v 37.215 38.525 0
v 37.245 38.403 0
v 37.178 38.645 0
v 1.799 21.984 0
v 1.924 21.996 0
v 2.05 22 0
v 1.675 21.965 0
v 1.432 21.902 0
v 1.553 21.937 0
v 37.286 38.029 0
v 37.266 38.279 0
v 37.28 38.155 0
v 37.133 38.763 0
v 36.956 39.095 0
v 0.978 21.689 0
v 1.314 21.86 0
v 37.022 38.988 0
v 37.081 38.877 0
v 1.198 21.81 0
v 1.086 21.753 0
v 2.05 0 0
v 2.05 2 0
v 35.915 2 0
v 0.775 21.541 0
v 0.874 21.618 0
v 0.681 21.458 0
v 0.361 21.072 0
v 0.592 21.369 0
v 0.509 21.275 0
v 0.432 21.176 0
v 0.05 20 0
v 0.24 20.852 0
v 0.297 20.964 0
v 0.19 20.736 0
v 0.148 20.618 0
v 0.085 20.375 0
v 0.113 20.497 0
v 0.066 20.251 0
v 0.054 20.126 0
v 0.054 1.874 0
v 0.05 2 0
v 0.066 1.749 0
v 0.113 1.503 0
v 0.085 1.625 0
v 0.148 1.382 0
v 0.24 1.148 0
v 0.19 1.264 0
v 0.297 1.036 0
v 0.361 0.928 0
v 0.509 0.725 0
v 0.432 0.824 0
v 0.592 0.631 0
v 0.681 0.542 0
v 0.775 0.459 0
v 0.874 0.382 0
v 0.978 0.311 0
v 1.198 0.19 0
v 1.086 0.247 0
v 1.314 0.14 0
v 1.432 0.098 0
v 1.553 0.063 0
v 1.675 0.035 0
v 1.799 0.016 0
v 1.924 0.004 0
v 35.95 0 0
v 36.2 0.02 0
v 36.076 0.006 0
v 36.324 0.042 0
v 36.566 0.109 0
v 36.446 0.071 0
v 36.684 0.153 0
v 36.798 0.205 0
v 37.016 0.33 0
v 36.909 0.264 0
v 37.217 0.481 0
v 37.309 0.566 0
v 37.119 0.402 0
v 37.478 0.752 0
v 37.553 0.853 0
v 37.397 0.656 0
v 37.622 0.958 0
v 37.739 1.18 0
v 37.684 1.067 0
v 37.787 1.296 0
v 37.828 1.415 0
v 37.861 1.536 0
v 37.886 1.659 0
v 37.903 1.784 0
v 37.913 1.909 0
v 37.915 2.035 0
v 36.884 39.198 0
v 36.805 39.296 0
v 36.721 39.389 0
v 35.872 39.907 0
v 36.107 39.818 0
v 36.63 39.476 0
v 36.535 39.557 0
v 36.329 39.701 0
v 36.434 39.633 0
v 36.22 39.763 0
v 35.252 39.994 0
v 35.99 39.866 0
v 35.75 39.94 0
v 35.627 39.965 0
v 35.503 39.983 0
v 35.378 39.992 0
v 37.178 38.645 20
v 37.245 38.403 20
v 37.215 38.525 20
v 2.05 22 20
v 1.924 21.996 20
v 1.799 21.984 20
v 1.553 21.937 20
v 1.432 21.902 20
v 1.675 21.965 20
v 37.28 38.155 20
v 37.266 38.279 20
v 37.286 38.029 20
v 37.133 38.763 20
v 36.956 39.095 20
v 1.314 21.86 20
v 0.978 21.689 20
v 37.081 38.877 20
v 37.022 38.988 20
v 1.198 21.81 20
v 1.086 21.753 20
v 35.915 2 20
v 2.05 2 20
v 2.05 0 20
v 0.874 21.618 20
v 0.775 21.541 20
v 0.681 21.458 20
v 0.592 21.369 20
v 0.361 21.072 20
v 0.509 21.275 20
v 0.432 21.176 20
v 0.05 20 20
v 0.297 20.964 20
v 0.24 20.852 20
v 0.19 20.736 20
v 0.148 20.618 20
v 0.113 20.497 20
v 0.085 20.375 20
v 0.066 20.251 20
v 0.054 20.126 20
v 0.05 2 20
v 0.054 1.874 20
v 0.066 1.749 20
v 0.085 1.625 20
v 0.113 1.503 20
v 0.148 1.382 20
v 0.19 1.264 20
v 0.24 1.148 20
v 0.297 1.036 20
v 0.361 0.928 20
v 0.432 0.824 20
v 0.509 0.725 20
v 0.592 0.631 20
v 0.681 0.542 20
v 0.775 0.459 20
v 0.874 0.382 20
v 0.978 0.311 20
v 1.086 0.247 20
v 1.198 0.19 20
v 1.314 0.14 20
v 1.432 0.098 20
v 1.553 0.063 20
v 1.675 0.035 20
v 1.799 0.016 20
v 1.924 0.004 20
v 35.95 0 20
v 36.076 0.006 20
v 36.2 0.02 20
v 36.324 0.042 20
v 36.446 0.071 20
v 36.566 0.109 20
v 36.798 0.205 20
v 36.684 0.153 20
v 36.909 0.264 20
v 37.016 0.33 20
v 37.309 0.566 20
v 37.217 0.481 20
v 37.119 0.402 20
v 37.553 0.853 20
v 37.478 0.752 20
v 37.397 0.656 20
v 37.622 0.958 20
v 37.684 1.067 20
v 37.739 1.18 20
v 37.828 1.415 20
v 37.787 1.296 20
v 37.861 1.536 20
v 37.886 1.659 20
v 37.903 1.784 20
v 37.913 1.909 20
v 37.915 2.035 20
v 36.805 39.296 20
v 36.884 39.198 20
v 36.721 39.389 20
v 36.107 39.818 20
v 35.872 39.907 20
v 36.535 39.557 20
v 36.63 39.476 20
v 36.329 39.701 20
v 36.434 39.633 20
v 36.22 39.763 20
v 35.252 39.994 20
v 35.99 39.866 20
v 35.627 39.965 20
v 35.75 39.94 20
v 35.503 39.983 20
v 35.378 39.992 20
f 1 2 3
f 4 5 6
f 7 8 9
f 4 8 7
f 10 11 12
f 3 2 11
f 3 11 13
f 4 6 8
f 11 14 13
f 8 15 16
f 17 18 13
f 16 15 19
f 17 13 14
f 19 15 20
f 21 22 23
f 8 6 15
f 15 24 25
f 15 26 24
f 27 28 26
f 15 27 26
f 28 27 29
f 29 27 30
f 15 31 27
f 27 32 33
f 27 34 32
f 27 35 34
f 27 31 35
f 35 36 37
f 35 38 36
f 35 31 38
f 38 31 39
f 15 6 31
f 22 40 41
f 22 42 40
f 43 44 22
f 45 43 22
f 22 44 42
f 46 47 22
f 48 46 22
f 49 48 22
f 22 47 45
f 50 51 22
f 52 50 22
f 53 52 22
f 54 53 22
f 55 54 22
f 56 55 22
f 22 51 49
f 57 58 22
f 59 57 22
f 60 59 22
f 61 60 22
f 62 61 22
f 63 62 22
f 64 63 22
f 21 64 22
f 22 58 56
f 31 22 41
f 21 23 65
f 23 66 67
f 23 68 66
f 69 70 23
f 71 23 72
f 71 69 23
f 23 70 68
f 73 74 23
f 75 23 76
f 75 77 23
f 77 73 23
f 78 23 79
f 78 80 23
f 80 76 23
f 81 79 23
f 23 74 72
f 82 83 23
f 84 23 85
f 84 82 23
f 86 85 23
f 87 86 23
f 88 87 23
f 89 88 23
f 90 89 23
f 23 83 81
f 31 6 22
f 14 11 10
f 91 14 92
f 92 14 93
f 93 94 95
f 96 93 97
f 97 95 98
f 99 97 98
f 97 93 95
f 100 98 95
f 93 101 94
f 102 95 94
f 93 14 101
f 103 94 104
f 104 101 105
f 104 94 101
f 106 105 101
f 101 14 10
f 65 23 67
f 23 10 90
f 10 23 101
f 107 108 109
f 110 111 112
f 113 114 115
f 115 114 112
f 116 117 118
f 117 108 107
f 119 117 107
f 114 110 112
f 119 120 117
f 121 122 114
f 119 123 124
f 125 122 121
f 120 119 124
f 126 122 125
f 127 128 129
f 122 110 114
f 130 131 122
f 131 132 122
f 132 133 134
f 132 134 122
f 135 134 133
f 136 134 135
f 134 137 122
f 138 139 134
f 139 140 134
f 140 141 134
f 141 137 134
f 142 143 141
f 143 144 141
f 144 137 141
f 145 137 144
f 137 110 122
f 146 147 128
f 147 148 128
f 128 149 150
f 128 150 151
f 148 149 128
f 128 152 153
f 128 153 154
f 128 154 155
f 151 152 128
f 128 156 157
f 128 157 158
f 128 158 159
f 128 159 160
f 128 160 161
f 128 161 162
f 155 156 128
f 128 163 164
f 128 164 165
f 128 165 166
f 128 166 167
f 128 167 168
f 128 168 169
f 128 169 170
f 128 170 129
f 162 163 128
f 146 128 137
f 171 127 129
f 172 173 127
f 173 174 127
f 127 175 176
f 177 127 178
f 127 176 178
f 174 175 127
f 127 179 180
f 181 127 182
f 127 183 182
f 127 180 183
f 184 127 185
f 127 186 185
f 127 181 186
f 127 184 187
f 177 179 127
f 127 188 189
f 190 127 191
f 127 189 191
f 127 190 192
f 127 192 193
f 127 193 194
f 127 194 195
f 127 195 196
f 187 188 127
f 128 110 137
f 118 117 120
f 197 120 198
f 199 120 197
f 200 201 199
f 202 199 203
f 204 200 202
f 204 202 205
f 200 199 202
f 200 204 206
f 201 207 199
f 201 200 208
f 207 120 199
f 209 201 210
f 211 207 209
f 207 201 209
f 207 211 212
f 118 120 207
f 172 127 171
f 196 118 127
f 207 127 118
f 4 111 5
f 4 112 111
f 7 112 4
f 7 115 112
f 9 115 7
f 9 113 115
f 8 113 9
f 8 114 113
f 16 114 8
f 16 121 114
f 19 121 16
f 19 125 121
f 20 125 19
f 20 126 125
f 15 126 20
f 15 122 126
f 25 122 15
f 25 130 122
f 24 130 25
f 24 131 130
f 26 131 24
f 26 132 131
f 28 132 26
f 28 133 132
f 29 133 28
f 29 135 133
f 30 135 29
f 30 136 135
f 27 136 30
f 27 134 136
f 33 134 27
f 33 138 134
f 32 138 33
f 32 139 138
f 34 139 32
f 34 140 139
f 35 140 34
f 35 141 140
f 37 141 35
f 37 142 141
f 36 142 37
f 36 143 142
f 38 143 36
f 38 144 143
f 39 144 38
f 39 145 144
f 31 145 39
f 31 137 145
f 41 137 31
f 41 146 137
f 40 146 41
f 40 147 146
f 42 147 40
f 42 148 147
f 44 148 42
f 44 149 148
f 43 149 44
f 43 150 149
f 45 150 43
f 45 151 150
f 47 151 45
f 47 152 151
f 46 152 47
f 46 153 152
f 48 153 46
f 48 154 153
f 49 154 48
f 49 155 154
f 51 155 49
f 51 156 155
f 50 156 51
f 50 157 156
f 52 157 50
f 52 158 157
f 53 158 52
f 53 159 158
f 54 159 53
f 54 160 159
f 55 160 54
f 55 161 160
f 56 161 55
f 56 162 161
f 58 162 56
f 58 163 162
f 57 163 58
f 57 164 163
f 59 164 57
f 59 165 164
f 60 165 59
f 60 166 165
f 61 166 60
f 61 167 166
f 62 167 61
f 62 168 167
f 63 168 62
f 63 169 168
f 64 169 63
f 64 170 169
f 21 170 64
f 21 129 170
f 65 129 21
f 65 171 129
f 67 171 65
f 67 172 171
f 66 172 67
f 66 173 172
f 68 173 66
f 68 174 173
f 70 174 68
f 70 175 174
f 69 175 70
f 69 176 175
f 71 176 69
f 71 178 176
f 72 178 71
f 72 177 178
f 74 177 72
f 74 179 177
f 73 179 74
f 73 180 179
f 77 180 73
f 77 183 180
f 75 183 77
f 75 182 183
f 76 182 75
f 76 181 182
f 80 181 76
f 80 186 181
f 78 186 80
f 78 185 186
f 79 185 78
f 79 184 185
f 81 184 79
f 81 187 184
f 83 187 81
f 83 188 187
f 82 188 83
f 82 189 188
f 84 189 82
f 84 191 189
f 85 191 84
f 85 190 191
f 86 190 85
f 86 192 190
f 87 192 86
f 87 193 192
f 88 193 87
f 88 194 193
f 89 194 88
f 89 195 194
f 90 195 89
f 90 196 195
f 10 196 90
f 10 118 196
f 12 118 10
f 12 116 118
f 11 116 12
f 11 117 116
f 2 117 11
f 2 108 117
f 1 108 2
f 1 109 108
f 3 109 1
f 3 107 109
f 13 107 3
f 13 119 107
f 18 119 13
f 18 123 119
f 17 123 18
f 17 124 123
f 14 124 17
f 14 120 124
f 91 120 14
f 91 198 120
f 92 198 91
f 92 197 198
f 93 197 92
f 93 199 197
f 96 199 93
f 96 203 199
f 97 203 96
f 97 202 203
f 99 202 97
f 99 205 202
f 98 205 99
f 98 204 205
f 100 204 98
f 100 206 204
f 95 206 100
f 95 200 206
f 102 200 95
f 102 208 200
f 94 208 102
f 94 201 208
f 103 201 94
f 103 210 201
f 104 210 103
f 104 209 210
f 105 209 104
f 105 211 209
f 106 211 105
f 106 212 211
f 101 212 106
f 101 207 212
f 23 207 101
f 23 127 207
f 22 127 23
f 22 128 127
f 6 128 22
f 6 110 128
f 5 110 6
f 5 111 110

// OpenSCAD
// Height: 34
$fn = 100;
TIGHTNESS = .05;

linear_extrude(20)
bracket();

module bracket() {
  translate([TIGHTNESS, 0, 0])
  difference() {
    square([2, 22]);
    fillet();

    translate([0, 22, 0])
    rotate(270)
    fillet();
  }

  translate([2 + TIGHTNESS, 0, 0])
  square([34 - 2 * TIGHTNESS, 2]);

  translate([36 - TIGHTNESS, 0, 0])
  rotate(1)
  difference() {
    square([2, 40]);

    translate([2, 0, 0])
    rotate(90)
    fillet();

    translate([2, 40, 0])
    rotate(180)
    fillet();
  }
}

module fillet(thickness = 2) {
  difference() {
    square(thickness * 2, center=true);

    translate([thickness, thickness, 0])
    circle(thickness);
  }
}
